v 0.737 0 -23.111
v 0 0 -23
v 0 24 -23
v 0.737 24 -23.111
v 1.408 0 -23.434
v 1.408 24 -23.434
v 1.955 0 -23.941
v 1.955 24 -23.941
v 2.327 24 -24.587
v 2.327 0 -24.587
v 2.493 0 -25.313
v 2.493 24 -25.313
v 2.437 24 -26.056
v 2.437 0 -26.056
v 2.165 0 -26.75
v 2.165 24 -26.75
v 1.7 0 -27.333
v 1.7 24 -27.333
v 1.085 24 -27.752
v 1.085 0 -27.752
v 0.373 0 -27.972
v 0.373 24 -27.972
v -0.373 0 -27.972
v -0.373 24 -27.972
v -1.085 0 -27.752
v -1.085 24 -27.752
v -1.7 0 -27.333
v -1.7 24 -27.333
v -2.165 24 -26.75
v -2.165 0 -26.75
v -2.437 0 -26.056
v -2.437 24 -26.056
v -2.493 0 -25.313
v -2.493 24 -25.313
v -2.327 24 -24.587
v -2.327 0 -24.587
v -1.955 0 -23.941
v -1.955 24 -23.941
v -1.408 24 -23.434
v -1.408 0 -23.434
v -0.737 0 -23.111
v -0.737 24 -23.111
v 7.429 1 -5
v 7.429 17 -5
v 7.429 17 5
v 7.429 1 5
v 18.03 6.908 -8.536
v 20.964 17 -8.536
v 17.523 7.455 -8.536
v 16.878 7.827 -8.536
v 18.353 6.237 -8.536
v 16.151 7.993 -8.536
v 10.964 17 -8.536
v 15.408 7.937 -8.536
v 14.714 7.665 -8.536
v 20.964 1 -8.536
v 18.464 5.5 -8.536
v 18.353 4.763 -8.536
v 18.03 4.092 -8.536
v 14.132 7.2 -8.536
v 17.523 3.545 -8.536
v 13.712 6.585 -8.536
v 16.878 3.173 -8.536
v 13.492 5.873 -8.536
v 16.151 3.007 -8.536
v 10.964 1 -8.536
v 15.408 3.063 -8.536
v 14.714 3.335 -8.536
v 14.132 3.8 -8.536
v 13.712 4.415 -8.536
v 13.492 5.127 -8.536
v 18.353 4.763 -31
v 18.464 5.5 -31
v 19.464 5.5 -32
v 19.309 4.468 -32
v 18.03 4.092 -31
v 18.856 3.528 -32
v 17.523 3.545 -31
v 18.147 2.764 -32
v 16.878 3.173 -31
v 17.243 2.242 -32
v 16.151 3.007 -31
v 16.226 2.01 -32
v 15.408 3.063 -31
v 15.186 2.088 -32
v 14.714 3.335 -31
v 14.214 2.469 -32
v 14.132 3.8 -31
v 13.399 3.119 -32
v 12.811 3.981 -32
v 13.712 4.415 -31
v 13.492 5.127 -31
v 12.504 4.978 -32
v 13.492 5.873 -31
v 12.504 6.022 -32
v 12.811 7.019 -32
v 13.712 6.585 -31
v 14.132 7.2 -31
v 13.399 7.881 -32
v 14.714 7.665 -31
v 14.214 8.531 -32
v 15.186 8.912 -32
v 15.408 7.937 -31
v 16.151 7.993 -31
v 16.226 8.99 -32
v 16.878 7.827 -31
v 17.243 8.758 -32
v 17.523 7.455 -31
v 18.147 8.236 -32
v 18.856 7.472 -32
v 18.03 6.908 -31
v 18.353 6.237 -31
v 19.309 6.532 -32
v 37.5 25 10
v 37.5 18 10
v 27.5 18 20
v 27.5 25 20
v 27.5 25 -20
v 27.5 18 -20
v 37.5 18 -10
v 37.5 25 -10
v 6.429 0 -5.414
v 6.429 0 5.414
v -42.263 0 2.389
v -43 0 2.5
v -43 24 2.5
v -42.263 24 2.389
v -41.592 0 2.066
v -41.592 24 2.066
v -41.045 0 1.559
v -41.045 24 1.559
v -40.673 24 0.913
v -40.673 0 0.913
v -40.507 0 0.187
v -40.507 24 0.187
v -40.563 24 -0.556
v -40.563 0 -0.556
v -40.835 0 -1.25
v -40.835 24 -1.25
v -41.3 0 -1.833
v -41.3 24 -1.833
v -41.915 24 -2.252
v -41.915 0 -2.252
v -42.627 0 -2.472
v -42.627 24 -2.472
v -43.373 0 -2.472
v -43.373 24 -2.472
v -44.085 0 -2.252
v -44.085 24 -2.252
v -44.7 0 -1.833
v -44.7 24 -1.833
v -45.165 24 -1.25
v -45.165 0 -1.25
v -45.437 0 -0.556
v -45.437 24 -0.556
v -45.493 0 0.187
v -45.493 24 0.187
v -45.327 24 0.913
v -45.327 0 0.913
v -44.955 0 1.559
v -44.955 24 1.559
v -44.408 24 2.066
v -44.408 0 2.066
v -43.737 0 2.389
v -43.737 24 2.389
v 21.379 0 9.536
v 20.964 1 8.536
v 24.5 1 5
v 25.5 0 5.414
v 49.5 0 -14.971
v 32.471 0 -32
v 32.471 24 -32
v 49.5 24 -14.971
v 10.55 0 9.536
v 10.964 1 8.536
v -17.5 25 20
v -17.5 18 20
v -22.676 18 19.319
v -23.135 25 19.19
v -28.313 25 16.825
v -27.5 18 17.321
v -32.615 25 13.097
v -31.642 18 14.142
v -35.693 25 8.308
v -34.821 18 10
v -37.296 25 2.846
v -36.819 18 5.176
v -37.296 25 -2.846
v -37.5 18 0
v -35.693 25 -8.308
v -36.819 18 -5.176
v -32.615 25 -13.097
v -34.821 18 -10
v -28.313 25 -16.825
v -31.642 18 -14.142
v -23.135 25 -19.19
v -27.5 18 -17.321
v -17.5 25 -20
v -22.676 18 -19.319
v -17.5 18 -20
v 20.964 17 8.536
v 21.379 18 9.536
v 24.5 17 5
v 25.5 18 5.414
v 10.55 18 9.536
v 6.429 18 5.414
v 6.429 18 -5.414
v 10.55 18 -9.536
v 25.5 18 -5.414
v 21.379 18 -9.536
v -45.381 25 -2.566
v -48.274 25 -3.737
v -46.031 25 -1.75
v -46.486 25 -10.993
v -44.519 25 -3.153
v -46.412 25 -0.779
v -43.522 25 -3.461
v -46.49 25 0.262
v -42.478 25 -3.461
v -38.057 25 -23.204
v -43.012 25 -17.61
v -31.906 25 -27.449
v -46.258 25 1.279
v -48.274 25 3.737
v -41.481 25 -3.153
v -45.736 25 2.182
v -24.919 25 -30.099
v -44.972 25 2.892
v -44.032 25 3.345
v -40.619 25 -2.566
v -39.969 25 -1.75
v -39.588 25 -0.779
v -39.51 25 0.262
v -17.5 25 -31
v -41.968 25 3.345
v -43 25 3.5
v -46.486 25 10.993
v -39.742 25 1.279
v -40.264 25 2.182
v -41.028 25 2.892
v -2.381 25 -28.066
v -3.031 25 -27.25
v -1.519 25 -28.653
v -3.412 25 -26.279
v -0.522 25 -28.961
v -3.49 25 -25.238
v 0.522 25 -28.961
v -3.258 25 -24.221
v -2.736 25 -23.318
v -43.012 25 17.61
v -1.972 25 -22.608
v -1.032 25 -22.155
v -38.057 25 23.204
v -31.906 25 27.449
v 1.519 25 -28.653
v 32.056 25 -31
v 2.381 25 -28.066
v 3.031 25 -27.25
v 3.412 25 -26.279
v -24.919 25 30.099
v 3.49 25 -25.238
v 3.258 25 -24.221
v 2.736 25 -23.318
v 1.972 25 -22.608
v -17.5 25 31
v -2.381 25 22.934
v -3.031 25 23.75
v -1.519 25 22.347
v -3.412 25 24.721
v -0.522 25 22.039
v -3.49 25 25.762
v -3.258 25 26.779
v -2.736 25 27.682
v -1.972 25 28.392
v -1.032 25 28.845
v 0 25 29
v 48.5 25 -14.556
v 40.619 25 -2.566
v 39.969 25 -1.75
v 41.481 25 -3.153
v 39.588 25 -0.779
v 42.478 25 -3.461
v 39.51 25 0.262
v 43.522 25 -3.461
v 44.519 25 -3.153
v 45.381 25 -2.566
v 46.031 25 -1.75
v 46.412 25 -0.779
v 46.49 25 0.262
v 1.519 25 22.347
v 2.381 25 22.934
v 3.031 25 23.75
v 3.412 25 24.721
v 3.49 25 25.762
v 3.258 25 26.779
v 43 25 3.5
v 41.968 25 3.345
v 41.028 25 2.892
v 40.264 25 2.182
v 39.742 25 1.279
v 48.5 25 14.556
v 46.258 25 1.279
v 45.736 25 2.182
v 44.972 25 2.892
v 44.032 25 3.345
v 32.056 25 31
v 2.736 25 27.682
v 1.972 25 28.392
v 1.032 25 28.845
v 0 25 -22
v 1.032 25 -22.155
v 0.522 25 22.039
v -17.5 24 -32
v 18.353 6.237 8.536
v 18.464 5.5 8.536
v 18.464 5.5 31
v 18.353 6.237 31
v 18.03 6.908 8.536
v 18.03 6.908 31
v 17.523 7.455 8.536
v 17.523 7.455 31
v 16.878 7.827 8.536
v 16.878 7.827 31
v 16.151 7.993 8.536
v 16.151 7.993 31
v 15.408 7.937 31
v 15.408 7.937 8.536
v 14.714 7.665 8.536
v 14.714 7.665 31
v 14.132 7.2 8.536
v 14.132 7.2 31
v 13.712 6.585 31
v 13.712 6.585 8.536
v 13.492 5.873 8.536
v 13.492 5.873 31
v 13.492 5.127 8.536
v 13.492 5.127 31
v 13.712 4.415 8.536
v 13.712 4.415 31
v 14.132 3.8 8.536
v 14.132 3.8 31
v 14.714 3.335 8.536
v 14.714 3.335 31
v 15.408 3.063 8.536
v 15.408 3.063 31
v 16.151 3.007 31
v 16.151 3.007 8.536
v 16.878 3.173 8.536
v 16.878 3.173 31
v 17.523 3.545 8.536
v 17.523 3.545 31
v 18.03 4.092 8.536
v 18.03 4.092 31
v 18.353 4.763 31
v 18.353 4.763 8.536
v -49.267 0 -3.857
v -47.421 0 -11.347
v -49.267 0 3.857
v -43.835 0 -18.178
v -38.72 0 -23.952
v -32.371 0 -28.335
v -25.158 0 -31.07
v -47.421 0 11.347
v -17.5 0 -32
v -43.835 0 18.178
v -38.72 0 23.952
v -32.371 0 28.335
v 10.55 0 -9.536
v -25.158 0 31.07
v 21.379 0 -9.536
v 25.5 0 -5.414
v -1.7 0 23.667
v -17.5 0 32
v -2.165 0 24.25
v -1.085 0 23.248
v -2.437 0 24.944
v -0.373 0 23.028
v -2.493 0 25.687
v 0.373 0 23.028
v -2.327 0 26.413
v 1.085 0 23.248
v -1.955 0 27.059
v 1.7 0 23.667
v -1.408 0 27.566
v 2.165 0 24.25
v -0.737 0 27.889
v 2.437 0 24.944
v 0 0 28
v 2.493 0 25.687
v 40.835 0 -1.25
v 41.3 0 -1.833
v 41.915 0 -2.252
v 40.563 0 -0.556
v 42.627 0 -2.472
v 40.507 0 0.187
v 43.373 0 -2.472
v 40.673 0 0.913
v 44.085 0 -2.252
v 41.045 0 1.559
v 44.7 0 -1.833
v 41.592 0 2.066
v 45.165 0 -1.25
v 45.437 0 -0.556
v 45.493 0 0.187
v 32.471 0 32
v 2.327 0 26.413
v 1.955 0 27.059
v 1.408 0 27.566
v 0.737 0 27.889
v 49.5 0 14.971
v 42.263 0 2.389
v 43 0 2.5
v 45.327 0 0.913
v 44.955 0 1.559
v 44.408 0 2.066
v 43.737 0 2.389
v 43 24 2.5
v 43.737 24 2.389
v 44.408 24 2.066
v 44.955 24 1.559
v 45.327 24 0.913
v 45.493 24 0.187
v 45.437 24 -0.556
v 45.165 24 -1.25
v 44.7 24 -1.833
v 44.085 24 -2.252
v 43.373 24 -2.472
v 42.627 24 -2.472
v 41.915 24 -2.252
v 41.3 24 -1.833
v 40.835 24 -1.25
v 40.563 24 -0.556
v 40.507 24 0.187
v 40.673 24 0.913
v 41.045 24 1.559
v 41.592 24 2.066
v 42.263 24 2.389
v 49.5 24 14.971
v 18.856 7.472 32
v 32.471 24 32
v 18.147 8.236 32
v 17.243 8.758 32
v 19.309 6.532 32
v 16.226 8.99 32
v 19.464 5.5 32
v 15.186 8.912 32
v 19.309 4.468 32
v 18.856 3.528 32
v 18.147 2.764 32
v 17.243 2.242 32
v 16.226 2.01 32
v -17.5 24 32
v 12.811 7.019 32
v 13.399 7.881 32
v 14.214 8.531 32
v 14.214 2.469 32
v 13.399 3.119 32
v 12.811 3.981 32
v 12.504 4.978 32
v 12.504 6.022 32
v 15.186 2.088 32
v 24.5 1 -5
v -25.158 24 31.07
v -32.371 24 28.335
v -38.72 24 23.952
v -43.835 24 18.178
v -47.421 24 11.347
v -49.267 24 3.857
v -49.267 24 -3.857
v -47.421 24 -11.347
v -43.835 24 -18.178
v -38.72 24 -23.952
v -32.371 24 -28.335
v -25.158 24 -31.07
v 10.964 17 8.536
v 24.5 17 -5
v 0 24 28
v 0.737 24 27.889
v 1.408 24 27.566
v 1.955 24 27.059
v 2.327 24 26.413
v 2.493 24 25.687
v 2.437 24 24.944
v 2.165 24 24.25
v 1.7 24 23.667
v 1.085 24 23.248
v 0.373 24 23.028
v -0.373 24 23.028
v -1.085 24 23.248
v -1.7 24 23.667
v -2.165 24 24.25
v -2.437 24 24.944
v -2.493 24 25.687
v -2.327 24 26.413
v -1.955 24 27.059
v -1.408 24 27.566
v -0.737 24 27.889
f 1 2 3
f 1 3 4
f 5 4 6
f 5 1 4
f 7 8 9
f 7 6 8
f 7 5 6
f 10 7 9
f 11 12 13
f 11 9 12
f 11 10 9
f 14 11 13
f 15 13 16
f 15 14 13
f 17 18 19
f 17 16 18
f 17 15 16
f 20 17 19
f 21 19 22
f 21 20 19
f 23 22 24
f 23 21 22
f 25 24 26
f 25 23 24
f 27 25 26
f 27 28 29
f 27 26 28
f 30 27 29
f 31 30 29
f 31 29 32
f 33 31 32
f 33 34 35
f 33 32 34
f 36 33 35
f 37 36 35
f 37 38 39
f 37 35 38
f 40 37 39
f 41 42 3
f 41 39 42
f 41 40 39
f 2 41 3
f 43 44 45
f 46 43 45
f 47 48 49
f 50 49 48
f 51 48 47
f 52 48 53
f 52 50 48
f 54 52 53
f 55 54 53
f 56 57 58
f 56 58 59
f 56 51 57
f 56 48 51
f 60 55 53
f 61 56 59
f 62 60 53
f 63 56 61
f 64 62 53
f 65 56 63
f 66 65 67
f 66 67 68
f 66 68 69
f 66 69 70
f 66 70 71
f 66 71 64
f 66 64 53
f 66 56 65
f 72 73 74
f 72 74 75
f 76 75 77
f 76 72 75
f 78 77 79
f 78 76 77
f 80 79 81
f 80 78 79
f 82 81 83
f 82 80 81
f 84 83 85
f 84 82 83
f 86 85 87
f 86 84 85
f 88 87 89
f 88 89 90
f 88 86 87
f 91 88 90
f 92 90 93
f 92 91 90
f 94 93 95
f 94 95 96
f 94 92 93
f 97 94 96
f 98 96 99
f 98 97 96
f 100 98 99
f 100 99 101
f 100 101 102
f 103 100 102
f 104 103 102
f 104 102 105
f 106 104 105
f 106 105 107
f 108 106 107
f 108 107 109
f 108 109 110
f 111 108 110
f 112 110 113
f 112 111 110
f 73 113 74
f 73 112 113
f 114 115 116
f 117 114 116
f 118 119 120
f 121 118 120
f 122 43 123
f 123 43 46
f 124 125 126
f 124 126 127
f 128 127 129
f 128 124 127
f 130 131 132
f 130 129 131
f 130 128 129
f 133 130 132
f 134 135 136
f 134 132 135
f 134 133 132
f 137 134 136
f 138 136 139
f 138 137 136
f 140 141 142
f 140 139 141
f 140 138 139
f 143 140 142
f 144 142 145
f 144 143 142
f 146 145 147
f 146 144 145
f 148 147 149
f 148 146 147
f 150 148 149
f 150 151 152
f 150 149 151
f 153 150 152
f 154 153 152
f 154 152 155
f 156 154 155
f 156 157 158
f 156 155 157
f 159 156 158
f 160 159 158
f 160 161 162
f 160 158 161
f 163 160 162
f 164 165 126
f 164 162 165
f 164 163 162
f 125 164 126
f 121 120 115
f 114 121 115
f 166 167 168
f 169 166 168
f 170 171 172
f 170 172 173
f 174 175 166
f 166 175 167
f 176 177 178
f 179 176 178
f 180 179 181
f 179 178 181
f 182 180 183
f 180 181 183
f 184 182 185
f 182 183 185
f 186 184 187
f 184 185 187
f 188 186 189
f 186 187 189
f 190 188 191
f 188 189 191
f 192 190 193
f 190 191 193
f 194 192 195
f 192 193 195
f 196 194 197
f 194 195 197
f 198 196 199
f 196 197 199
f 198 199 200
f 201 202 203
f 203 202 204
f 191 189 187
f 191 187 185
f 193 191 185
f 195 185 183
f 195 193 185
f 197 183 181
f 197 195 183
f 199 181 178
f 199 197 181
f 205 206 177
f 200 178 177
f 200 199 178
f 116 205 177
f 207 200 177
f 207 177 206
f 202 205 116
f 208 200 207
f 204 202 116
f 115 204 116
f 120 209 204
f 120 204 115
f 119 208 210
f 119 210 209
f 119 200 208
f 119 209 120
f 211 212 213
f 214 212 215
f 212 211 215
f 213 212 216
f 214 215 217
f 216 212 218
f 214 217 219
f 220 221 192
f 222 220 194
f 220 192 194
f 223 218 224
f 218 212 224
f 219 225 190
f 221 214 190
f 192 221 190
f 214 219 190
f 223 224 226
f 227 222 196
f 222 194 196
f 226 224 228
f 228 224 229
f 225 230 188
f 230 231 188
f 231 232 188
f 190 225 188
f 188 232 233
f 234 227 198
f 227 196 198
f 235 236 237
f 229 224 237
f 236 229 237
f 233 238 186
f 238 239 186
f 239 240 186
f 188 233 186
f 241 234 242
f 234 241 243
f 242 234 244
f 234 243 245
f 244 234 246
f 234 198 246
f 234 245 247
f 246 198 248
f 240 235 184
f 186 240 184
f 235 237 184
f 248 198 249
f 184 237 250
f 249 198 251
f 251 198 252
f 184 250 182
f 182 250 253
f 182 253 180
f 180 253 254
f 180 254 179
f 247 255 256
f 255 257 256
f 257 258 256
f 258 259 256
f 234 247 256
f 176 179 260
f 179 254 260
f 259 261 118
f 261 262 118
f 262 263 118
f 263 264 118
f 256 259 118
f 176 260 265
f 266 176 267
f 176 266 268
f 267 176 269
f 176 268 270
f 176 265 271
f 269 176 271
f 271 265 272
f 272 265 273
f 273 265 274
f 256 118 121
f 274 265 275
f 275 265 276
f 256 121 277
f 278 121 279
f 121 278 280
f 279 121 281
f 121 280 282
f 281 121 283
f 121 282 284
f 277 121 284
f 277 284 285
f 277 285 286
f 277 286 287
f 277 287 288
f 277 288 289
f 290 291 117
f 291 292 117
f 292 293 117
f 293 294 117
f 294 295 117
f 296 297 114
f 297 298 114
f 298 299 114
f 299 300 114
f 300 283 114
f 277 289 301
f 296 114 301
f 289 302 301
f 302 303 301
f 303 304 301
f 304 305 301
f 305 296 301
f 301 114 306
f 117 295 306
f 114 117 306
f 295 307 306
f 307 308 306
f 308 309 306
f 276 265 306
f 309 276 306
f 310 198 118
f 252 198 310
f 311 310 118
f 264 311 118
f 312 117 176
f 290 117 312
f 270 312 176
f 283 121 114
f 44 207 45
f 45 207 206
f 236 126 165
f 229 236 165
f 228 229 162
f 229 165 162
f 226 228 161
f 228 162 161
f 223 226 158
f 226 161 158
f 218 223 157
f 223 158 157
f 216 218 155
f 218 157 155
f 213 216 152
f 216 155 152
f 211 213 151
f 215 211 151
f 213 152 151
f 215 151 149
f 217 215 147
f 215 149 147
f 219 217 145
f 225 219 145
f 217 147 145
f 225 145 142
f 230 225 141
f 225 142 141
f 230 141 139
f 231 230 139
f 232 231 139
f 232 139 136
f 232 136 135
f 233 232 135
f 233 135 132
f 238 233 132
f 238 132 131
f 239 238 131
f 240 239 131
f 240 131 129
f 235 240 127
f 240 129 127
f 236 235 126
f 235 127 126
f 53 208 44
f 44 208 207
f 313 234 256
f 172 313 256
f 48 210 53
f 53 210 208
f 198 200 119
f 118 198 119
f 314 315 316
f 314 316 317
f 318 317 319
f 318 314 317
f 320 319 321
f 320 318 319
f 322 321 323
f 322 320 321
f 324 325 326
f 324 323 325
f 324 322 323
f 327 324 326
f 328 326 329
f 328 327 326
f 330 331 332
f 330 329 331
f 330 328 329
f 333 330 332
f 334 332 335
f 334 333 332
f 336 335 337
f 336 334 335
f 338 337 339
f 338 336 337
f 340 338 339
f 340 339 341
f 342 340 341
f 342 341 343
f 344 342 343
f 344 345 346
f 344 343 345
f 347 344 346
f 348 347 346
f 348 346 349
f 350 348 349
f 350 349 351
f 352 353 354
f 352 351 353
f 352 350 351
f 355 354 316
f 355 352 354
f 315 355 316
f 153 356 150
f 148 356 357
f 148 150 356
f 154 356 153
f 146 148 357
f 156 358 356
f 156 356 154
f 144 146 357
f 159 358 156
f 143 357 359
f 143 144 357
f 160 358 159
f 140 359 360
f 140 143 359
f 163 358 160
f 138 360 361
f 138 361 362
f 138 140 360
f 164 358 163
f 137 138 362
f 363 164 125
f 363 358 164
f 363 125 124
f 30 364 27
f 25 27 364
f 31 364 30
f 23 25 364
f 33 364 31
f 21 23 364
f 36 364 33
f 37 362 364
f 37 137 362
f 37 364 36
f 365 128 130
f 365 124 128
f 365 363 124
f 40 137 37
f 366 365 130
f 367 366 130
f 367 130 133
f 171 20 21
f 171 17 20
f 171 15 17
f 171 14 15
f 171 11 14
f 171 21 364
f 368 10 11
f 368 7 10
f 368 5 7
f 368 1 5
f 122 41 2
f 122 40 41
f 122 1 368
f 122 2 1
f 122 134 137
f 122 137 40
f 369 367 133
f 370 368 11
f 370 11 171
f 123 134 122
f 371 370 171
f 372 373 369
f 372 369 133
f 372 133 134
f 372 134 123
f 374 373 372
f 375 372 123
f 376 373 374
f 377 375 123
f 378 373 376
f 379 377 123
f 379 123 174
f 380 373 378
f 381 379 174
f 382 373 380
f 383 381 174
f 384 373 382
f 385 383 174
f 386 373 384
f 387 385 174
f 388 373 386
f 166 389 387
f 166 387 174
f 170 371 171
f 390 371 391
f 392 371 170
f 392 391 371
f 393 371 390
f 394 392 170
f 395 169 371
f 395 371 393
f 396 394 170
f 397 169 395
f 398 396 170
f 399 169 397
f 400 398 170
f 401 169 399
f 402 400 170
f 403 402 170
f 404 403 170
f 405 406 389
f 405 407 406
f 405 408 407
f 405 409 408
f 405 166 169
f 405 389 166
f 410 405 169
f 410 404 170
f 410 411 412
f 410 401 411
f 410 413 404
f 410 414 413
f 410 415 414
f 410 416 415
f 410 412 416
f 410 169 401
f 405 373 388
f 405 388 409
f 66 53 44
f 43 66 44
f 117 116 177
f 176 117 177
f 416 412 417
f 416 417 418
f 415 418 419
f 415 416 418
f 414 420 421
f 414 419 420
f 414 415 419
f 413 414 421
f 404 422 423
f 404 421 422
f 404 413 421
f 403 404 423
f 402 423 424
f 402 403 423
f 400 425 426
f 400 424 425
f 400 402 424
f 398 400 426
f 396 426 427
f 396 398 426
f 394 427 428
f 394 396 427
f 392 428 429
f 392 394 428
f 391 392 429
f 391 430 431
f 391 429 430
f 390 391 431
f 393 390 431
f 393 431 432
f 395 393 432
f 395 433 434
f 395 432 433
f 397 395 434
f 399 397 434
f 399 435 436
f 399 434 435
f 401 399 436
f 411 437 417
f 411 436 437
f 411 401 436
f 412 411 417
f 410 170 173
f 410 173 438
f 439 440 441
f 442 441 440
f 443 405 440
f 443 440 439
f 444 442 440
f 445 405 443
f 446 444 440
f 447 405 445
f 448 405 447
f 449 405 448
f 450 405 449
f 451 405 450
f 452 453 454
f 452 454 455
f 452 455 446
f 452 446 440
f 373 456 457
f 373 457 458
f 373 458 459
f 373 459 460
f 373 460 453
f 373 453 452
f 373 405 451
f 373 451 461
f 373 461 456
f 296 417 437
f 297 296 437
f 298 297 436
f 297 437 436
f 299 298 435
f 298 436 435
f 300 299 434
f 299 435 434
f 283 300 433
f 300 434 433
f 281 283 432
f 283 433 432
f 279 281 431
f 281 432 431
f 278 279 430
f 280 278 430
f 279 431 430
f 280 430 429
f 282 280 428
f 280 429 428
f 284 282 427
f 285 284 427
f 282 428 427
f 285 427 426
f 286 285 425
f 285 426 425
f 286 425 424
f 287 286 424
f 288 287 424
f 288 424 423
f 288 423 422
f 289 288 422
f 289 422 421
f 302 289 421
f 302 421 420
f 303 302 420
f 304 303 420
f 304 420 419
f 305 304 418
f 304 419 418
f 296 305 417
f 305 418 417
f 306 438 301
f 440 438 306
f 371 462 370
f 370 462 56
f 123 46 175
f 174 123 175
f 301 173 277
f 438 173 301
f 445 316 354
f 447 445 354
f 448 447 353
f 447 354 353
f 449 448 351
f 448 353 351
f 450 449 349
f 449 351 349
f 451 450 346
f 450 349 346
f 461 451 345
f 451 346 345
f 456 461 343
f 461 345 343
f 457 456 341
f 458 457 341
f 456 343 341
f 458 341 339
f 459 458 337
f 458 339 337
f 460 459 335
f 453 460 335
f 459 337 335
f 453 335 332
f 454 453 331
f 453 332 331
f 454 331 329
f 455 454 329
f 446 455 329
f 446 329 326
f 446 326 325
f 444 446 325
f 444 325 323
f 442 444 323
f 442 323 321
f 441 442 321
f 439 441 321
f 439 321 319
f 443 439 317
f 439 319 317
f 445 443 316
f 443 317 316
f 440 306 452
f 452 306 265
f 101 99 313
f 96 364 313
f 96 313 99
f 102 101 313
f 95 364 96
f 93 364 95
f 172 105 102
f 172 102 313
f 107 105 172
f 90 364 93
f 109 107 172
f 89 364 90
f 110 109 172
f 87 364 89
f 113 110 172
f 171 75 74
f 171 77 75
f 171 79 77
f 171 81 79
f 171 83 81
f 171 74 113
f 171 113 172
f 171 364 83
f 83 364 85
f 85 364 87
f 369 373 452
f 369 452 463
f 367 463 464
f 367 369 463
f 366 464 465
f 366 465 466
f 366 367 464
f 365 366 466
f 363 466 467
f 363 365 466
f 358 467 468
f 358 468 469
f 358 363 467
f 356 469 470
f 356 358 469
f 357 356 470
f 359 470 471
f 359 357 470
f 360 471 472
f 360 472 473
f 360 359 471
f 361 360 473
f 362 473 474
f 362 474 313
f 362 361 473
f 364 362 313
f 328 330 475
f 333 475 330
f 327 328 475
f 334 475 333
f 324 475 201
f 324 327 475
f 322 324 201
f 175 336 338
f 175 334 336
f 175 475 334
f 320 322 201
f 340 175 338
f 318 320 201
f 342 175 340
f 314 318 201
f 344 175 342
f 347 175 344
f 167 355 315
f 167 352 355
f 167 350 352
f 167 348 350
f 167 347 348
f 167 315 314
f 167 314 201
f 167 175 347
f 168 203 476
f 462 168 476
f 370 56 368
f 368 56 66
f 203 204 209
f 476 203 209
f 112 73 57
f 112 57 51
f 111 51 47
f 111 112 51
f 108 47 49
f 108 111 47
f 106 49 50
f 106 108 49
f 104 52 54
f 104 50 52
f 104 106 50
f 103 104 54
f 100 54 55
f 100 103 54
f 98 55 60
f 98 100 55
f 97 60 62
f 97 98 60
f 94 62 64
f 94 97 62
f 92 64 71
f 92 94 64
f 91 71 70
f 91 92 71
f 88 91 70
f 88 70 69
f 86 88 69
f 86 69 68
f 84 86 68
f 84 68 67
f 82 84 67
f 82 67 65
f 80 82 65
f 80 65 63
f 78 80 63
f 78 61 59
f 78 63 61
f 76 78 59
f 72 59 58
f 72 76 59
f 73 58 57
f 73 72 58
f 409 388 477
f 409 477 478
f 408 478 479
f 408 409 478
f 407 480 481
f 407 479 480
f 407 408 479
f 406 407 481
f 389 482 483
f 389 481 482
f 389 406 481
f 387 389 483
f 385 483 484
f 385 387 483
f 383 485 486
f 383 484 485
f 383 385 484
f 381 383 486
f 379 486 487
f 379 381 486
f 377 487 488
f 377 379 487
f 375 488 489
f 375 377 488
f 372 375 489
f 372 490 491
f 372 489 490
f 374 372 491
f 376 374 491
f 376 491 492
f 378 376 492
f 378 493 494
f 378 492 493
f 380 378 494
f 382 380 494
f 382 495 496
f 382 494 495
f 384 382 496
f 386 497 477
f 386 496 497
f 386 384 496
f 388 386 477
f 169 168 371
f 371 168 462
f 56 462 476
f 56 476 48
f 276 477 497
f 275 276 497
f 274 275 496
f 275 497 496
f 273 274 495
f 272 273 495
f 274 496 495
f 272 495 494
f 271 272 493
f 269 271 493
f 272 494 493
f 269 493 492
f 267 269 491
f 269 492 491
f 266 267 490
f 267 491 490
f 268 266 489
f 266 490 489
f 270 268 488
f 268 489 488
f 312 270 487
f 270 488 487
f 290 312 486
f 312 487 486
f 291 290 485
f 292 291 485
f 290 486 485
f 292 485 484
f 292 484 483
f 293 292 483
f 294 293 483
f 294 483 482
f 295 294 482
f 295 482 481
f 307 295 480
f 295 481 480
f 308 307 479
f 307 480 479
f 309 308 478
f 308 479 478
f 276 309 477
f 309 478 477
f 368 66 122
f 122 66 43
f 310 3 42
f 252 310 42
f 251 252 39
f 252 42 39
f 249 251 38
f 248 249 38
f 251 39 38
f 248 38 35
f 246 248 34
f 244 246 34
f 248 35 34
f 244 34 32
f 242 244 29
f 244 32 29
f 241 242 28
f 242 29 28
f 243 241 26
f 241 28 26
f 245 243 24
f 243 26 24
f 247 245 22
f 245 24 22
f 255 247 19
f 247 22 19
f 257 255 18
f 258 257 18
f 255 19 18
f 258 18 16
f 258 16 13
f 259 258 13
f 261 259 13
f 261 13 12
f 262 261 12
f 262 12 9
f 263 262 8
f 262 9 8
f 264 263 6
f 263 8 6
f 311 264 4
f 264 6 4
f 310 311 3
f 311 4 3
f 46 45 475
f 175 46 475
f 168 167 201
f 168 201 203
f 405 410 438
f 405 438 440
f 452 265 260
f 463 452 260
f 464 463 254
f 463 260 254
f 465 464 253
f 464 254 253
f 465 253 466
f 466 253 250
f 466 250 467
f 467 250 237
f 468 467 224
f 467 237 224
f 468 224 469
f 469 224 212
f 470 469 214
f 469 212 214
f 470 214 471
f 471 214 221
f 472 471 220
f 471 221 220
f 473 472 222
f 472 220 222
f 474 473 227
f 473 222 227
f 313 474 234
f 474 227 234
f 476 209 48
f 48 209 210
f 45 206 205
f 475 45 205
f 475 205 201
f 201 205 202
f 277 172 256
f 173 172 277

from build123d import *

# Parameters (mm, degrees)
BOSS_EXTRUDE1_DEPTH     = 18
CUT_EXTRUDE1_DEPTH      = 18
EXTRUDE_THIN1_DEPTH     = 25
CUT_EXTRUDE2_DEPTH      = 77.021378572
CUT_EXTRUDE2_DEPTH_BACK = 77.021378572
SKETCH3_R               = 2.5
CHAMFER1_SIZE           = 1
CUT_EXTRUDE3_DEPTH      = 65.02538559
CUT_EXTRUDE3_DEPTH_BACK = 65.02538559
SKETCH6_R               = 2.5
CHAMFER3_SIZE           = 1


with BuildPart() as part:
    # Sketch1 → Boss-Extrude1 (new body)
    with BuildSketch(Plane(origin=(0, 0, 0), x_dir=(1, 0, 0), z_dir=(0, 1, 0))):
        with BuildLine():
            Line((37.5, -10), (37.5, 10))
            Line((37.5, 10), (27.5, 20))
            Line((27.5, 20), (-17.5, 20))
            ThreePointArc((-17.5, 20), (-31.64213568, 14.142135567), (-37.5, -1.6e-07))
            ThreePointArc((-37.5, -1.6e-07), (-31.642135567, -14.14213568), (-17.5, -20))
            Line((-17.5, -20), (27.5, -20))
            Line((27.5, -20), (37.5, -10))
        make_face()
    extrude(amount=BOSS_EXTRUDE1_DEPTH)

    # Sketch2 → Cut-Extrude1 (cut)
    with BuildSketch(Plane.XZ):
        Polygon((24.5, 5), (24.5, -5), (20.964466094, -8.535533906), (10.964466094, -8.535533906), (7.428932188, -5), (7.428932188, 5), (10.964466094, 8.535533906), (20.964466094, 8.535533906), align=None)
    extrude(amount=-CUT_EXTRUDE1_DEPTH, mode=Mode.SUBTRACT)

    # Sketch4 → Extrude-Thin1 (add)
    with BuildSketch(Plane.XZ):
        with BuildLine():
            Line((-17.5, -32), (32.470562748, -32))
            Line((32.470562748, -32), (49.5, -14.970562748))
            Line((49.5, -14.970562748), (49.5, 14.970562748))
            Line((49.5, 14.970562748), (32.470562748, 32))
            Line((32.470562748, 32), (-17.5, 32))
            ThreePointArc((-17.5, 32), (-49.5, 0), (-17.5, -32))
        make_face()
        with BuildLine():
            Line((-17.5, -20), (27.5, -20))
            Line((27.5, -20), (37.5, -10))
            Line((37.5, -10), (37.5, 10))
            Line((37.5, 10), (27.5, 20))
            Line((27.5, 20), (-17.5, 20))
            ThreePointArc((-17.5, 20), (-37.5, 0), (-17.5, -20))
        make_face(mode=Mode.SUBTRACT)
    extrude(amount=-EXTRUDE_THIN1_DEPTH)

    # Sketch3 → Cut-Extrude2 (cut, two sides: drawn at the far end of the back side and taken through both)
    with BuildSketch(Plane.XY.offset(20).offset(-CUT_EXTRUDE2_DEPTH_BACK)):
        with Locations((15.964466094, 5.5)):
            Circle(SKETCH3_R)
    extrude(amount=CUT_EXTRUDE2_DEPTH + CUT_EXTRUDE2_DEPTH_BACK, mode=Mode.SUBTRACT)

    # Chamfer1
    chamfer1_edges = [part.edges().sort_by_distance(p)[0] for p in [
        (15.964466094, 0, 8.535533906),
        (9.196699141, 0, 6.767766953),
        (7.428932188, 0, 0),
        (9.196699141, 0, -6.767766953),
        (15.964466094, 0, -8.535533906),
        (22.732233047, 0, -6.767766953),
        (24.5, 0, 0),
        (22.732233047, 0, 6.767766953),
        (9.196699141, 18, 6.767766953),
        (7.428932188, 18, 0),
        (9.196699141, 18, -6.767766953),
        (15.964466094, 18, -8.535533906),
        (22.732233047, 18, -6.767766953),
        (24.5, 18, 0),
        (22.732233047, 18, 6.767766953),
        (15.964466094, 18, 8.535533906),
        (-49.5, 25, 0),
        (7.485281374, 25, 32),
        (40.985281374, 25, 23.485281374),
        (49.5, 25, 0),
        (40.985281374, 25, -23.485281374),
        (7.485281374, 25, -32),
        (13.464466094, 5.5, -32),
        (13.464466094, 5.5, 32),
    ]]
    chamfer(chamfer1_edges, length=CHAMFER1_SIZE)

    # Sketch6 → Cut-Extrude3 (cut, two sides: drawn at the far end of the back side and taken through both)
    with BuildSketch(Plane(origin=(0, 25, 0), x_dir=(1, 0, 0), z_dir=(0, 1, 0)).offset(-CUT_EXTRUDE3_DEPTH_BACK)):
        with Locations(Location((0, 25.5, 0), (0, 0, 270))):
            Circle(SKETCH6_R)
        with Locations(Location((0, -25.5, 0), (0, 0, 270))):
            Circle(SKETCH6_R)
        with Locations(Location((43, 0, 0), (0, 0, 270))):
            Circle(SKETCH6_R)
        with Locations(Location((-43, 0, 0), (0, 0, 270))):
            Circle(SKETCH6_R)
    extrude(amount=CUT_EXTRUDE3_DEPTH + CUT_EXTRUDE3_DEPTH_BACK, mode=Mode.SUBTRACT)

    # Chamfer3
    chamfer3_edges = [part.edges().sort_by_distance(p)[0] for p in [
        (0, 25, -28),
        (0, 25, 23),
        (43, 25, -2.5),
        (-43, 25, -2.5),
    ]]
    chamfer(chamfer3_edges, length=CHAMFER3_SIZE)


solid = part.part
